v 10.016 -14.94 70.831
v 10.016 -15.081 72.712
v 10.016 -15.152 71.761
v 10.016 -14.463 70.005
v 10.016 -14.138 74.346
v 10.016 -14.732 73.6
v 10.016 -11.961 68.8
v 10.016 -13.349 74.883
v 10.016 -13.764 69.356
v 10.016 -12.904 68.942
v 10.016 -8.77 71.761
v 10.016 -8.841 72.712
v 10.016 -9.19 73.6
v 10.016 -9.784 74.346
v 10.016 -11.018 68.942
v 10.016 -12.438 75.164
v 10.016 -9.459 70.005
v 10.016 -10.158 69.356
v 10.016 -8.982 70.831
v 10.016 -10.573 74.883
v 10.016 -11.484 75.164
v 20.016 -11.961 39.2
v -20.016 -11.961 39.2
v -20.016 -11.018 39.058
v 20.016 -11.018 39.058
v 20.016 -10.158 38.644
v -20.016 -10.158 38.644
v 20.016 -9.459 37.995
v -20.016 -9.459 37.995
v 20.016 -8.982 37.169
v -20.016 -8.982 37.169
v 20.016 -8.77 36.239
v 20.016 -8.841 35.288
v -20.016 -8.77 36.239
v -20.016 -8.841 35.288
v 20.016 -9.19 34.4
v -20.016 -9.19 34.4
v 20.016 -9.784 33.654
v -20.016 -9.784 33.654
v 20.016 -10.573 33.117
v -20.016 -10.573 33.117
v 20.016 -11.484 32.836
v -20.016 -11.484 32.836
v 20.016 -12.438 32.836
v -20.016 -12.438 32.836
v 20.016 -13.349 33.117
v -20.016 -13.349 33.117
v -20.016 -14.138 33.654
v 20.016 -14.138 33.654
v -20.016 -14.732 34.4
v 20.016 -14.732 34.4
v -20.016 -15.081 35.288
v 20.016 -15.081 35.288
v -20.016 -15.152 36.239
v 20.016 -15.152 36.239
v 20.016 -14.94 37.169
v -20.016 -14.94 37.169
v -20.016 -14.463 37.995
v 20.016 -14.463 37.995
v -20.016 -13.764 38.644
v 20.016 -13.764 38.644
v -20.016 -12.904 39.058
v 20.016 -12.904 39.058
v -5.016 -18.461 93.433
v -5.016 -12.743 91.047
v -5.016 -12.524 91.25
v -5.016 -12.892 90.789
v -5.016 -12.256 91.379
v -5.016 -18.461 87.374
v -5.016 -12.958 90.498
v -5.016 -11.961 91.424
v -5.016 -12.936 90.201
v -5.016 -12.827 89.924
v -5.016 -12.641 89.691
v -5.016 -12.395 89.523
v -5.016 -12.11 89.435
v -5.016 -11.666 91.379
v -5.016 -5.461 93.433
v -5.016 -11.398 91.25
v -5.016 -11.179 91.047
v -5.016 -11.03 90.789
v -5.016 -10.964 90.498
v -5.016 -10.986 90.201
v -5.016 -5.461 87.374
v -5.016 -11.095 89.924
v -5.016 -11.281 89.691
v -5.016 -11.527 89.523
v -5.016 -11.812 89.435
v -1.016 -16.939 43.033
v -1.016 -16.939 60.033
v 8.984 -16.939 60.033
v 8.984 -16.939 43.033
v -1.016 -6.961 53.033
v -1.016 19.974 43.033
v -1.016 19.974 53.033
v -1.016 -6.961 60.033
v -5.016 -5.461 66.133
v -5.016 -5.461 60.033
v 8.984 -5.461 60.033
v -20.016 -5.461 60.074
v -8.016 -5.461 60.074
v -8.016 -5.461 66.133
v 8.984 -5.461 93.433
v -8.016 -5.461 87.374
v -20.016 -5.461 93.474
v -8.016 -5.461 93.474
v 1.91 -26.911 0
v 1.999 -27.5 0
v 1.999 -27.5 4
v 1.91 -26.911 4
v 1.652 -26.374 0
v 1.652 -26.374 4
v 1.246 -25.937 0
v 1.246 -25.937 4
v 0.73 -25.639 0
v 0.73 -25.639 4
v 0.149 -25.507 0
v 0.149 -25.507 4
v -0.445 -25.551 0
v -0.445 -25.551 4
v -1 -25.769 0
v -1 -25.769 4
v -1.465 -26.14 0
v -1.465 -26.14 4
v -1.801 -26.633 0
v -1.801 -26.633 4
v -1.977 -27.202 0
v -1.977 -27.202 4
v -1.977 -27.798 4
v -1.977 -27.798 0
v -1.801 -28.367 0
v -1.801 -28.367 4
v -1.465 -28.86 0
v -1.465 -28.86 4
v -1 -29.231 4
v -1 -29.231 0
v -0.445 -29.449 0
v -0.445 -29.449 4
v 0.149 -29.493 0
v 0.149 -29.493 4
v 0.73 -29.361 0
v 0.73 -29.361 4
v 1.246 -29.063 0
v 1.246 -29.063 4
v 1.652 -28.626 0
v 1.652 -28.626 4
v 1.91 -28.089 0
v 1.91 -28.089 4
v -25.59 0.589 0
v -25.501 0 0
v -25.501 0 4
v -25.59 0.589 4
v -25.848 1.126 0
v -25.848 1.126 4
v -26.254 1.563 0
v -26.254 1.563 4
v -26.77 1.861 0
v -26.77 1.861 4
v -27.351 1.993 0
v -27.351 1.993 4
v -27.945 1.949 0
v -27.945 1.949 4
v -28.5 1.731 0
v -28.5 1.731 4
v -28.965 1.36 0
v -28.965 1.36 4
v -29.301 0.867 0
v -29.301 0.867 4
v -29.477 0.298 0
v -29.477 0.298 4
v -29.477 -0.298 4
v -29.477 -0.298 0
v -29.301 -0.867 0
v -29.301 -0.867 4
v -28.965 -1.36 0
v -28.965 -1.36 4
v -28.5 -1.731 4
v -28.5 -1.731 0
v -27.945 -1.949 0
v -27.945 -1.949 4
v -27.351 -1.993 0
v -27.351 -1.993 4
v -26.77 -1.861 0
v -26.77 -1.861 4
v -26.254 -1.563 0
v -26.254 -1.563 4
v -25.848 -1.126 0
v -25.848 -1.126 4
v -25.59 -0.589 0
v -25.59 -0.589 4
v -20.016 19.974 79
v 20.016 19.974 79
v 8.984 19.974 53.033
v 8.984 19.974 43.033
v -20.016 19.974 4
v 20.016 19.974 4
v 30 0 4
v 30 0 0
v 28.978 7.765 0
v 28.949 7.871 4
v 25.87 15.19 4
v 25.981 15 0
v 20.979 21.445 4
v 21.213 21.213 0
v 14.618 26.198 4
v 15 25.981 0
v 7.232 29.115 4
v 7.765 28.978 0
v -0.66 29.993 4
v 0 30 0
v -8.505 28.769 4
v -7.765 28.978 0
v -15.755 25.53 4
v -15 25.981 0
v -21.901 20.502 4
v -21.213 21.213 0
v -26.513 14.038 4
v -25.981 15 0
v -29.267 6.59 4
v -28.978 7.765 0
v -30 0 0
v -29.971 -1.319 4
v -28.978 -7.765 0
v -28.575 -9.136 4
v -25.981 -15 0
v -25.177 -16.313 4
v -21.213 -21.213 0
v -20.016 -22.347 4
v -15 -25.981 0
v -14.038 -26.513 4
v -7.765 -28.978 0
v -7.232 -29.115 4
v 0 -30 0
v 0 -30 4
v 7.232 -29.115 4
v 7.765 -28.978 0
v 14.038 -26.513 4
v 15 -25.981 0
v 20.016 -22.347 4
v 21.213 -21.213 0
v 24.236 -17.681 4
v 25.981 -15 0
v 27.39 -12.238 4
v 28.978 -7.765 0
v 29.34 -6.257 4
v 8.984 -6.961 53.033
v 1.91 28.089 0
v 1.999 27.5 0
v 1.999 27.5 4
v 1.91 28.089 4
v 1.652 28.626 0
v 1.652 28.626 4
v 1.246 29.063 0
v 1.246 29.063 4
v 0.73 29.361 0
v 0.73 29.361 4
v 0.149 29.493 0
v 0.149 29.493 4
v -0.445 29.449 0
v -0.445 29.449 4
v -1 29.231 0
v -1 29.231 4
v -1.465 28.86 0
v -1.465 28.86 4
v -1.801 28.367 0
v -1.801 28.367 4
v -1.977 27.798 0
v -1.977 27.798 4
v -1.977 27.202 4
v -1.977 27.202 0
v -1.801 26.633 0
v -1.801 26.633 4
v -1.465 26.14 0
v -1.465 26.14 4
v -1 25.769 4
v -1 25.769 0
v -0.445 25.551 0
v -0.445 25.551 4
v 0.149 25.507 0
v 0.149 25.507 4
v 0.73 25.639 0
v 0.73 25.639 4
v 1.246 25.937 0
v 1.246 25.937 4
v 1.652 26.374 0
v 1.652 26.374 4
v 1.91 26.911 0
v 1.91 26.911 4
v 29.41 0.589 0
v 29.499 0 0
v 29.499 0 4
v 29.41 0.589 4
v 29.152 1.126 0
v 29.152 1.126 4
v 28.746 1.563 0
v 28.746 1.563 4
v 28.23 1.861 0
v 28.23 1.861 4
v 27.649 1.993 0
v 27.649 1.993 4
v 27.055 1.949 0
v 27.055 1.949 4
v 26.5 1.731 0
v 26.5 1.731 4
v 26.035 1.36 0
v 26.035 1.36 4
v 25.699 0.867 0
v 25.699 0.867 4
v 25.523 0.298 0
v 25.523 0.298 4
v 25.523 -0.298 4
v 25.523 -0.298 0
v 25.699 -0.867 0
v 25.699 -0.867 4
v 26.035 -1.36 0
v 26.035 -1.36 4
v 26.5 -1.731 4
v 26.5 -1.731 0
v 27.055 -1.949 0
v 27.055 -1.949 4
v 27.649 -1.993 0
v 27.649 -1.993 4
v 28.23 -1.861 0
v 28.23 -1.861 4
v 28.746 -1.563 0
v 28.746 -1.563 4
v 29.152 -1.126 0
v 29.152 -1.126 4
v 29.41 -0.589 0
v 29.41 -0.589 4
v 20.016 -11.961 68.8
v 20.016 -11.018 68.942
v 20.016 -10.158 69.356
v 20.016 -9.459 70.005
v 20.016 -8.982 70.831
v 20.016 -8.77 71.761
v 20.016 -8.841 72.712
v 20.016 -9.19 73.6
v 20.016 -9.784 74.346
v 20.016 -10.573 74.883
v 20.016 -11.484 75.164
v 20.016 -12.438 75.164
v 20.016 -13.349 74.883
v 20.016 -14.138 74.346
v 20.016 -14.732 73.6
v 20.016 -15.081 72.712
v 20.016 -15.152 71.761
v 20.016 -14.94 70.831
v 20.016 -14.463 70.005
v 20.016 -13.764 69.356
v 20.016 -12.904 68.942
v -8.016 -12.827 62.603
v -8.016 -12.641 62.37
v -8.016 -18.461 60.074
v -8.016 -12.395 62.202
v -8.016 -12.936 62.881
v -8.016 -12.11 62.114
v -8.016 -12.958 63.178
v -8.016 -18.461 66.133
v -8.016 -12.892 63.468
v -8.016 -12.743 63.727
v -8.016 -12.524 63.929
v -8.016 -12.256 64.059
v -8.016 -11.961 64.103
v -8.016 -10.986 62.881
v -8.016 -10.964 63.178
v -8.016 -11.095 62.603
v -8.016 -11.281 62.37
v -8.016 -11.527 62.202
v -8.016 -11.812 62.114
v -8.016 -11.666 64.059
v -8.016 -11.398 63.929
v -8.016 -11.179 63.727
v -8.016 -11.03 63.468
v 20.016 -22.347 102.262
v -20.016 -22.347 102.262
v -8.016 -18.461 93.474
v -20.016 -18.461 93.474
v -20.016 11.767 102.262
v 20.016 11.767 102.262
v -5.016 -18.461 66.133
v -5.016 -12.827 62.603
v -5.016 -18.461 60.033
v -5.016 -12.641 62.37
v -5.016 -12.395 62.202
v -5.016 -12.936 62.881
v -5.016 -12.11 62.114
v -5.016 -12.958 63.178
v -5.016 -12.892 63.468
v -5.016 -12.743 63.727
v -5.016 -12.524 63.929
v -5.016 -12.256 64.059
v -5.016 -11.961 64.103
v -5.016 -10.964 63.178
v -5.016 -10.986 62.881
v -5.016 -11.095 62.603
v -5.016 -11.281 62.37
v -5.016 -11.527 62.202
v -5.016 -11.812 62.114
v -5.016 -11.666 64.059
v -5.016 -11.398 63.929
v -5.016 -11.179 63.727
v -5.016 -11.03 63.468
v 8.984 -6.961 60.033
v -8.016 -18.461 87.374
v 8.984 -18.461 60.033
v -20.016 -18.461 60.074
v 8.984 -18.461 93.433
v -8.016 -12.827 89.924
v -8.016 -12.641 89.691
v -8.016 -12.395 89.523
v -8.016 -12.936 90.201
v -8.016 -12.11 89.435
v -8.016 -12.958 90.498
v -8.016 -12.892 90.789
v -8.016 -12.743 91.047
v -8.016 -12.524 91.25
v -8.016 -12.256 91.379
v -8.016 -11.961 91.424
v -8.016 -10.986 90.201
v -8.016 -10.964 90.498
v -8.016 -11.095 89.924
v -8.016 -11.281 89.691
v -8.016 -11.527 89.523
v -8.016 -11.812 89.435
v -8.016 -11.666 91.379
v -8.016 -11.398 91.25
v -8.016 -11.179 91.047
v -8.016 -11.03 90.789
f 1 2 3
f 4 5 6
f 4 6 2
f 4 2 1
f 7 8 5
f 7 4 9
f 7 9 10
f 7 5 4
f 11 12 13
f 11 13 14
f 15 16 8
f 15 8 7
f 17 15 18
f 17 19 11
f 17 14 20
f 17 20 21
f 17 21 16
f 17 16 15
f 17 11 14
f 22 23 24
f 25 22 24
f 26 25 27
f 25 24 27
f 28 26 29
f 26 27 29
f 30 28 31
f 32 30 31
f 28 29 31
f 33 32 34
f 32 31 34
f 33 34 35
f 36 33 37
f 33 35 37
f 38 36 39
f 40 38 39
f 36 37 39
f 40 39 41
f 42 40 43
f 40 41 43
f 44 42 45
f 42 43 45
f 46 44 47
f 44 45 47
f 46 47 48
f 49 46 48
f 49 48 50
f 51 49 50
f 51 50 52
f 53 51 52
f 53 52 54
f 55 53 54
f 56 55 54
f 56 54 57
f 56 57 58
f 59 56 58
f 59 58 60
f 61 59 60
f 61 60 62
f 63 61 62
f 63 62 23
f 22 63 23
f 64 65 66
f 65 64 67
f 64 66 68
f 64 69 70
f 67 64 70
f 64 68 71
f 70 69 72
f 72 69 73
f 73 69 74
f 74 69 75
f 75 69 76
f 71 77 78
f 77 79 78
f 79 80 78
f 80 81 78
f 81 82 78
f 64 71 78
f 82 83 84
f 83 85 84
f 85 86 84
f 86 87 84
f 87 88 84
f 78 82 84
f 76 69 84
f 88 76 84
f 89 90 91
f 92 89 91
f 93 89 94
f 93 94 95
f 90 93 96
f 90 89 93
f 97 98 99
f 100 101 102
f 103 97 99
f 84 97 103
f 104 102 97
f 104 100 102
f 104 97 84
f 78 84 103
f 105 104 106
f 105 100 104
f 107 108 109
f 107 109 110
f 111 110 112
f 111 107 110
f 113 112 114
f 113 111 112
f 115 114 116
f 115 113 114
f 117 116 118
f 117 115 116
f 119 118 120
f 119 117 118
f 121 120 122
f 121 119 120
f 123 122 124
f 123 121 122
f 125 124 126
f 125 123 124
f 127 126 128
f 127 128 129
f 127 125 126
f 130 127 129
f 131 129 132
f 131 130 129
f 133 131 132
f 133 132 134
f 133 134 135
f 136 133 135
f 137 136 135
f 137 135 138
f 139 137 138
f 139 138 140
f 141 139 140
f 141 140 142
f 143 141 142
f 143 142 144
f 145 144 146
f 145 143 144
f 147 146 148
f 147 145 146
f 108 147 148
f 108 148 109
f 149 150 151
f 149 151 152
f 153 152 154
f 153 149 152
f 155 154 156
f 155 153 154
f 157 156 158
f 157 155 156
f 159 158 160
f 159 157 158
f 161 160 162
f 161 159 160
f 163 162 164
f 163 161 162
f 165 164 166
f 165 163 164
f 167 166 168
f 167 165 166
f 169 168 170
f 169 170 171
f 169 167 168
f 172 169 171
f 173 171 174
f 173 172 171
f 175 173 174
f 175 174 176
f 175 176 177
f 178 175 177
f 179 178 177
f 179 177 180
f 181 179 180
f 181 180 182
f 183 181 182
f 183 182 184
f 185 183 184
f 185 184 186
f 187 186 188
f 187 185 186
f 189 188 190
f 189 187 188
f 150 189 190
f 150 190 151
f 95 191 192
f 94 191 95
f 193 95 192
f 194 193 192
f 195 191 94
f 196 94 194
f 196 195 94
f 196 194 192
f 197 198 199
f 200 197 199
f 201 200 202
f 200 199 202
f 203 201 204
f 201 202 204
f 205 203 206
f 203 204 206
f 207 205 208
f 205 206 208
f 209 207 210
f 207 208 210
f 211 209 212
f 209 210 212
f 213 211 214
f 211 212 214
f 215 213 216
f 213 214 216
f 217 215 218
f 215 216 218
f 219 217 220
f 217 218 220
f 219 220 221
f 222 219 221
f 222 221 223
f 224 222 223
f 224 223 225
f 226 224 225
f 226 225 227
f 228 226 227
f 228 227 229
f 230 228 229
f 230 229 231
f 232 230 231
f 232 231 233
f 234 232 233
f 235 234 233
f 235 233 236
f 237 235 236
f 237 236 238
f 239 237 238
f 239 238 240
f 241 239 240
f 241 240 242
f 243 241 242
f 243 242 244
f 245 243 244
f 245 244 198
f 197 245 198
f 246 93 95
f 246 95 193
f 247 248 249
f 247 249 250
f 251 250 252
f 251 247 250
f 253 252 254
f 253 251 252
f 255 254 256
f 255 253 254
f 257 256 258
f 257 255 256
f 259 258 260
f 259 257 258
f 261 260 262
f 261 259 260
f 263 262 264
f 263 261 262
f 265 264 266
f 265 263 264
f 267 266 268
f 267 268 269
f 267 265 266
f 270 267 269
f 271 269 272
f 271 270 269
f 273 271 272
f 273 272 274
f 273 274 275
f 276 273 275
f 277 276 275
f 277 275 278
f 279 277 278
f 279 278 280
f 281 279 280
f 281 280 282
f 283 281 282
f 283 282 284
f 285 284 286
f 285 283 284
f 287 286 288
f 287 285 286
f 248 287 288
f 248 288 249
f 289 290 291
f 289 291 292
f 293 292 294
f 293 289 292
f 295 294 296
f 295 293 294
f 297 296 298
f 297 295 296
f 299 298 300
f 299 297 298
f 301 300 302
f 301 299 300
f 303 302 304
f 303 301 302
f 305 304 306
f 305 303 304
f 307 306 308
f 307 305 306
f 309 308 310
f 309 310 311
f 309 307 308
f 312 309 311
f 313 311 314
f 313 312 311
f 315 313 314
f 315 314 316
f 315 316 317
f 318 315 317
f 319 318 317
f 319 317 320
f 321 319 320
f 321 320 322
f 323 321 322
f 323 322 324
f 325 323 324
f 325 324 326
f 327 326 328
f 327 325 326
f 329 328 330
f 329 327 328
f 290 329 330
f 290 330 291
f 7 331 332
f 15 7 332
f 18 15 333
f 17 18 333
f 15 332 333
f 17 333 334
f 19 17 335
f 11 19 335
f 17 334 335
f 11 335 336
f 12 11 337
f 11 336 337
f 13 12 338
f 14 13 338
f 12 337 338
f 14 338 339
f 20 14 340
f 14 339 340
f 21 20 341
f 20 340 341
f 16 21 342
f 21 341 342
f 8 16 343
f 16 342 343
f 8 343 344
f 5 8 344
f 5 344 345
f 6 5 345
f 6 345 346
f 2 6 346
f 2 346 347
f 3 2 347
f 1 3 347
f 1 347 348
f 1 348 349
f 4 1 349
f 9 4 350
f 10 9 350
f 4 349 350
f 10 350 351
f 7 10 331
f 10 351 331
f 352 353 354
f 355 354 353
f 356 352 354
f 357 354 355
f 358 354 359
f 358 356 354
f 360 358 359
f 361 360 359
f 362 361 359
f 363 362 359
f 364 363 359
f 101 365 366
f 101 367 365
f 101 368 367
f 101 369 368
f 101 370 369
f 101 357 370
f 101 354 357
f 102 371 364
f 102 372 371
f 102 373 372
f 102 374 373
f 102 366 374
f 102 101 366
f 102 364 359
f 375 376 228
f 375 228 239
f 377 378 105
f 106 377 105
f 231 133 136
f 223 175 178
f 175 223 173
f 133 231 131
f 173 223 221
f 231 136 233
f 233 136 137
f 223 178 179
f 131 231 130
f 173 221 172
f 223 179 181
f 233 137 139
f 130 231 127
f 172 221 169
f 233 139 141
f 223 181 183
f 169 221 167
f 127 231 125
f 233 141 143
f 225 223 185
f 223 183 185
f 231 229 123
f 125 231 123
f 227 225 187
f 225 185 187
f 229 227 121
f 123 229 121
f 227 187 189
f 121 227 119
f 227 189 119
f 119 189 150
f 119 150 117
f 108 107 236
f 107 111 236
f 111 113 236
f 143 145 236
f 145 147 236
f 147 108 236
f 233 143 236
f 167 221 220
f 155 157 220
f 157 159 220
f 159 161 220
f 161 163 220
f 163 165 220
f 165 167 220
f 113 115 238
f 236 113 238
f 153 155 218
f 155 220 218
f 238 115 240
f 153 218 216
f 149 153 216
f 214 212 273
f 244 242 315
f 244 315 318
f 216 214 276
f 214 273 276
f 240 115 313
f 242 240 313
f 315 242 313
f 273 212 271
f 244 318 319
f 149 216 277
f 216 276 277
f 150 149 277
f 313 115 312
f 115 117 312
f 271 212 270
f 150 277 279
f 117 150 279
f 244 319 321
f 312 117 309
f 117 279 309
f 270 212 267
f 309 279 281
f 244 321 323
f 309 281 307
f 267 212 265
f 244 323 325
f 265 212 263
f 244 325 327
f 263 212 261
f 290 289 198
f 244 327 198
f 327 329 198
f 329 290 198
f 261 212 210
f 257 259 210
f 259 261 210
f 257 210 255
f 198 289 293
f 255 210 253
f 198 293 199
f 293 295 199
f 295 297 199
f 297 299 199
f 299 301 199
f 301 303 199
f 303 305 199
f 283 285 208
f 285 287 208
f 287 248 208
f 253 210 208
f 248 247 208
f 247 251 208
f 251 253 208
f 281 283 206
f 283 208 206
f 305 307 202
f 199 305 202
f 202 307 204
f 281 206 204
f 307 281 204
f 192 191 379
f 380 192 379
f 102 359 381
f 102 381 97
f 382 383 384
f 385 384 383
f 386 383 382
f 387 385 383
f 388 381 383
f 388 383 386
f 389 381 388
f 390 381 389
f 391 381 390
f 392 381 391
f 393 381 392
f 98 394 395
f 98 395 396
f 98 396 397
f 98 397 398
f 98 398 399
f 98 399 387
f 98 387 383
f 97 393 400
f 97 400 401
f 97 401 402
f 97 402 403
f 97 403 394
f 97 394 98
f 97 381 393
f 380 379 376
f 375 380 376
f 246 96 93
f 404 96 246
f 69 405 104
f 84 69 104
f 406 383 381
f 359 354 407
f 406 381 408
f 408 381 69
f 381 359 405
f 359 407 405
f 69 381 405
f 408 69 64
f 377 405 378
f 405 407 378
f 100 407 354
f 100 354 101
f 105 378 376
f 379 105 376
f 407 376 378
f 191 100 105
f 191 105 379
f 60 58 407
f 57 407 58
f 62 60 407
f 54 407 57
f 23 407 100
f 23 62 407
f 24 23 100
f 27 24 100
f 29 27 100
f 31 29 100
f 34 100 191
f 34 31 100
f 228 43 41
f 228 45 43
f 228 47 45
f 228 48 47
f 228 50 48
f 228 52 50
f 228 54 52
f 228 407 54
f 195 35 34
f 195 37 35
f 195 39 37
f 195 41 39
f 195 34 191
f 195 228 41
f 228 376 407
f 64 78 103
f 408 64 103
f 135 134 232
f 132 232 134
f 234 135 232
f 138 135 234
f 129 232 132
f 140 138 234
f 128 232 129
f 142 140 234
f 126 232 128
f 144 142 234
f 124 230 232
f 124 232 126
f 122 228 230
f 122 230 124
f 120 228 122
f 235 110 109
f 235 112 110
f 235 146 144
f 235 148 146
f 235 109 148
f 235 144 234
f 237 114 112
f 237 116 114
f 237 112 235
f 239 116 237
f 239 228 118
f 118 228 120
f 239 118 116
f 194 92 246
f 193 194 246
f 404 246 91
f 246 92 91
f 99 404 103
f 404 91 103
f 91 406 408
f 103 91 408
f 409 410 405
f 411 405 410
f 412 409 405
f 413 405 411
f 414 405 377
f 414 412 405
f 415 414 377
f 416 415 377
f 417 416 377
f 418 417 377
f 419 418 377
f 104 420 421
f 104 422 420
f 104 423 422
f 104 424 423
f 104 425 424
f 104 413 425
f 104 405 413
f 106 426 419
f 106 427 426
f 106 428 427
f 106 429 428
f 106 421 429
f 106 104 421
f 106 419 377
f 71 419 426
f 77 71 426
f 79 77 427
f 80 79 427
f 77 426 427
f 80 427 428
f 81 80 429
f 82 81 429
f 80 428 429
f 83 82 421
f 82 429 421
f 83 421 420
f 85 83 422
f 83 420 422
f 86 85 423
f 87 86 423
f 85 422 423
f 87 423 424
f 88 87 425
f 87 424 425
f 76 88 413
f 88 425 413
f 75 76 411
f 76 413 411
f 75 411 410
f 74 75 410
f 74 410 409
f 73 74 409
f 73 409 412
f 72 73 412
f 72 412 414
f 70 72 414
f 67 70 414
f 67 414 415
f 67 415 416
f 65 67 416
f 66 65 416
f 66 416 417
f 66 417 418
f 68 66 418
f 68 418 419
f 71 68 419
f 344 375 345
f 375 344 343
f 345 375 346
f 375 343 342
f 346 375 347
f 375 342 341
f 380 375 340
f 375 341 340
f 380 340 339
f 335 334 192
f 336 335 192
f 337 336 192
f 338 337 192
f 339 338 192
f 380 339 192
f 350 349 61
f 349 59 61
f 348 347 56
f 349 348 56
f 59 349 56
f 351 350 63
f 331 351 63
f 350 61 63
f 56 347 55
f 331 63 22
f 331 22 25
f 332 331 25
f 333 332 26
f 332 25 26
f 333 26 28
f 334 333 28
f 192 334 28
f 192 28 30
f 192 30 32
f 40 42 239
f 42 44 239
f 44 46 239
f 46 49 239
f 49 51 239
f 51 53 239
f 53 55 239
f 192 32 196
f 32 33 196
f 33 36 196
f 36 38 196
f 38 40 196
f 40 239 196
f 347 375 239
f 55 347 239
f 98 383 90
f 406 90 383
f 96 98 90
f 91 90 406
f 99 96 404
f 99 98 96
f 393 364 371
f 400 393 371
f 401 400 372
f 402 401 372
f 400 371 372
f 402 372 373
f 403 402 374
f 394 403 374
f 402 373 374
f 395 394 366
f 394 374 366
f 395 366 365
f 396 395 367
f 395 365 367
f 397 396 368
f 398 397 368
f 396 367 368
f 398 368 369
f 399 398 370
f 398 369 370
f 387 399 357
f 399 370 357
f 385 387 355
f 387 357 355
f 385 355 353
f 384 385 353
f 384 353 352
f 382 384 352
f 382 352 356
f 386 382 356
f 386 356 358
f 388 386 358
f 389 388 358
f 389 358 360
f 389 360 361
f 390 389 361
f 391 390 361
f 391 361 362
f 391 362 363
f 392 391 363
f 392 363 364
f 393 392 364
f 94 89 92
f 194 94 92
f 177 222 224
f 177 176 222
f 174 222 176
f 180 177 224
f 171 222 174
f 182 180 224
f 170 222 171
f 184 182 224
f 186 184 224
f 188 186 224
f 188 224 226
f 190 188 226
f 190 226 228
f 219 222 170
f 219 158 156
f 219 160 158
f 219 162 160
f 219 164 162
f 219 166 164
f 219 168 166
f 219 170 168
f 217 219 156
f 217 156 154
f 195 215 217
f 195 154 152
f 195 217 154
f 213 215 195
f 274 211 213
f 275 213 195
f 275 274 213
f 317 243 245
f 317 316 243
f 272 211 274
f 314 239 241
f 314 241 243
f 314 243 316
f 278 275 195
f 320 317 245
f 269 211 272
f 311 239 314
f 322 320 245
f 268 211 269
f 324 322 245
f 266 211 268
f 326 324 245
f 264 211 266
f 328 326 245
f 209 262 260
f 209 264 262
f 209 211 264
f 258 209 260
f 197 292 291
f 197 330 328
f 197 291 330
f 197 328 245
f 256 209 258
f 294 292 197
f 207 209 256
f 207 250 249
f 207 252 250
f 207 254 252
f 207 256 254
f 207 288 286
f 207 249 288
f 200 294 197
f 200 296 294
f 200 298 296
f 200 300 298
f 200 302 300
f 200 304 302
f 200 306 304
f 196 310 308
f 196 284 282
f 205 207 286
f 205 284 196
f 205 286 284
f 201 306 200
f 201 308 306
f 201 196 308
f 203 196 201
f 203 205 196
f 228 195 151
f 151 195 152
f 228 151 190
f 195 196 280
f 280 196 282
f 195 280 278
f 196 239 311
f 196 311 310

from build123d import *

# Parameters (mm, degrees)
CROQUIS1_R                 = 30
CROQUIS1_R_2               = 1.99901262
SALIENTE_EXTRUIR1_DEPTH    = 4
CROQUIS2_W                 = 40.0311451
CROQUIS2_H                 = 42.320959557
SALIENTE_EXTRUIR2_DEPTH    = 150
CORTAR_EXTRUIR1_REACH      = 166.674
CROQUIS3_R                 = 3.2
CROQUIS4_W                 = 33.4
CROQUIS4_H                 = 13
CORTAR_EXTRUIR2_DEPTH      = 12
CROQUIS5_W                 = 21.241045897
CROQUIS5_H                 = 13
CORTAR_EXTRUIR3_DEPTH      = 17
CROQUIS6_R                 = 1
CORTAR_EXTRUIR4_DEPTH      = 5
CORTAR_EXTRUIR6_DEPTH      = 165.674094798
CORTAR_EXTRUIR6_DEPTH_BACK = 165.674094798
CROQUIS10_R                = 3.2
CORTAR_EXTRUIR10_DEPTH     = 10
CROQUIS11_W                = 14
CROQUIS11_H                = 13
CORTAR_EXTRUIR11_DEPTH     = 6.1
CROQUIS12_W                = 10
CROQUIS12_H                = 9.978436174
CORTAR_EXTRUIR12_DEPTH     = 17
CROQUIS13_W                = 10
CROQUIS13_H                = 10
CORTAR_EXTRUIR13_DEPTH     = 45
CROQUIS11_3_W              = 14
CROQUIS11_3_H              = 13
CORTAR_EXTRUIR18_DEPTH     = 27.3


with BuildPart() as part:
    # Croquis1 → Saliente-Extruir1 (new body)
    with BuildSketch(Plane.XY):
        Circle(CROQUIS1_R)
        with Locations((27.5, 0)):
            Circle(CROQUIS1_R_2, mode=Mode.SUBTRACT)
        with Locations((0, -27.5)):
            Circle(CROQUIS1_R_2, mode=Mode.SUBTRACT)
        with Locations((-27.5, 0)):
            Circle(CROQUIS1_R_2, mode=Mode.SUBTRACT)
        with Locations((0, 27.5)):
            Circle(CROQUIS1_R_2, mode=Mode.SUBTRACT)
    extrude(amount=SALIENTE_EXTRUIR1_DEPTH)

    # Croquis2 → Saliente-Extruir2 (add)
    with BuildSketch(Plane.XY.offset(4)):
        with Locations((0, -1.186261717)):
            Rectangle(CROQUIS2_W, CROQUIS2_H)
    extrude(amount=SALIENTE_EXTRUIR2_DEPTH)

    # Croquis3 → Cortar-Extruir1 (cut, up to next)
    with BuildSketch(Plane.ZY.offset(20.01557255), mode=Mode.PRIVATE) as cortar_extruir1_sk1:
        with Locations((36, -11.961033968)):
            Circle(CROQUIS3_R)
    cortar_extruir1_tool1 = extrude(cortar_extruir1_sk1.sketch, amount=-CORTAR_EXTRUIR1_REACH, mode=Mode.PRIVATE) & part.part
    add(cortar_extruir1_tool1.solids().sort_by_distance((-20.015573, -11.961034, 36))[0], mode=Mode.SUBTRACT)

    # Croquis4 → Cortar-Extruir2 (cut)
    with BuildSketch(Plane.ZY.offset(20.01557255)):
        with Locations((76.773642677, -11.961033968)):
            Rectangle(CROQUIS4_W, CROQUIS4_H)
    extrude(amount=-CORTAR_EXTRUIR2_DEPTH, mode=Mode.SUBTRACT)

    # Croquis5 → Cortar-Extruir3 (cut)
    with BuildSketch(Plane.ZY.offset(8.01557255)):
        with Locations((76.753119728, -11.961033968)):
            Rectangle(CROQUIS5_W, CROQUIS5_H)
    extrude(amount=-CORTAR_EXTRUIR3_DEPTH, mode=Mode.SUBTRACT)

    # Croquis6 → Cortar-Extruir4 (cut)
    with BuildSketch(Plane.ZY.offset(8.01557255)):
        with Locations((63.103119729, -11.961033968)):
            Circle(CROQUIS6_R)
        with Locations((90.423642677, -11.961033968)):
            Circle(CROQUIS6_R)
    extrude(amount=-CORTAR_EXTRUIR4_DEPTH, mode=Mode.SUBTRACT)

    # Croquis7 → Cortar-Extruir6 (cut, two sides: drawn at the far end of the back side and taken through both)
    with BuildSketch(Plane.ZY.offset(20.01557255).offset(-CORTAR_EXTRUIR6_DEPTH_BACK)):
        Polygon((102.262078688, -22.346741496), (154, -22.346741496), (154, 19.974218061), (79, 19.974218061), (102.262078688, 11.767260679), align=None)
    extrude(amount=CORTAR_EXTRUIR6_DEPTH + CORTAR_EXTRUIR6_DEPTH_BACK, mode=Mode.SUBTRACT)

    # Croquis10 → Cortar-Extruir10 (cut)
    with BuildSketch(Plane(origin=(20.01557255, 0, 0), x_dir=(0, 0, -1), z_dir=(1, 0, 0))):
        with Locations((-72, -11.961033968)):
            Circle(CROQUIS10_R)
    extrude(amount=-CORTAR_EXTRUIR10_DEPTH, mode=Mode.SUBTRACT)

    # Croquis11 → Cortar-Extruir11 (cut)
    with BuildSketch(Plane.XY.offset(66.13259678)):
        with Locations((1.98442745, -11.961033968)):
            Rectangle(CROQUIS11_W, CROQUIS11_H)
    extrude(amount=-CORTAR_EXTRUIR11_DEPTH, mode=Mode.SUBTRACT)

    # Croquis12 → Cortar-Extruir12 (cut)
    with BuildSketch(Plane.XY.offset(60.03259678)):
        with Locations((3.98442745, -11.950252055)):
            Rectangle(CROQUIS12_W, CROQUIS12_H)
    extrude(amount=-CORTAR_EXTRUIR12_DEPTH, mode=Mode.SUBTRACT)

    # Croquis13 → Cortar-Extruir13 (cut)
    with BuildSketch(Plane.XZ.offset(6.961033968)):
        with Locations((3.98442745, 48.03259678)):
            Rectangle(CROQUIS13_W, CROQUIS13_H)
    extrude(amount=-CORTAR_EXTRUIR13_DEPTH, mode=Mode.SUBTRACT)

    # Croquis11<3> → Cortar-Extruir18 (cut)
    with BuildSketch(Plane.XY.offset(66.13259678)):
        with Locations((1.98442745, -11.961033968)):
            Rectangle(CROQUIS11_3_W, CROQUIS11_3_H)
    extrude(amount=CORTAR_EXTRUIR18_DEPTH, mode=Mode.SUBTRACT)


solid = part.part
